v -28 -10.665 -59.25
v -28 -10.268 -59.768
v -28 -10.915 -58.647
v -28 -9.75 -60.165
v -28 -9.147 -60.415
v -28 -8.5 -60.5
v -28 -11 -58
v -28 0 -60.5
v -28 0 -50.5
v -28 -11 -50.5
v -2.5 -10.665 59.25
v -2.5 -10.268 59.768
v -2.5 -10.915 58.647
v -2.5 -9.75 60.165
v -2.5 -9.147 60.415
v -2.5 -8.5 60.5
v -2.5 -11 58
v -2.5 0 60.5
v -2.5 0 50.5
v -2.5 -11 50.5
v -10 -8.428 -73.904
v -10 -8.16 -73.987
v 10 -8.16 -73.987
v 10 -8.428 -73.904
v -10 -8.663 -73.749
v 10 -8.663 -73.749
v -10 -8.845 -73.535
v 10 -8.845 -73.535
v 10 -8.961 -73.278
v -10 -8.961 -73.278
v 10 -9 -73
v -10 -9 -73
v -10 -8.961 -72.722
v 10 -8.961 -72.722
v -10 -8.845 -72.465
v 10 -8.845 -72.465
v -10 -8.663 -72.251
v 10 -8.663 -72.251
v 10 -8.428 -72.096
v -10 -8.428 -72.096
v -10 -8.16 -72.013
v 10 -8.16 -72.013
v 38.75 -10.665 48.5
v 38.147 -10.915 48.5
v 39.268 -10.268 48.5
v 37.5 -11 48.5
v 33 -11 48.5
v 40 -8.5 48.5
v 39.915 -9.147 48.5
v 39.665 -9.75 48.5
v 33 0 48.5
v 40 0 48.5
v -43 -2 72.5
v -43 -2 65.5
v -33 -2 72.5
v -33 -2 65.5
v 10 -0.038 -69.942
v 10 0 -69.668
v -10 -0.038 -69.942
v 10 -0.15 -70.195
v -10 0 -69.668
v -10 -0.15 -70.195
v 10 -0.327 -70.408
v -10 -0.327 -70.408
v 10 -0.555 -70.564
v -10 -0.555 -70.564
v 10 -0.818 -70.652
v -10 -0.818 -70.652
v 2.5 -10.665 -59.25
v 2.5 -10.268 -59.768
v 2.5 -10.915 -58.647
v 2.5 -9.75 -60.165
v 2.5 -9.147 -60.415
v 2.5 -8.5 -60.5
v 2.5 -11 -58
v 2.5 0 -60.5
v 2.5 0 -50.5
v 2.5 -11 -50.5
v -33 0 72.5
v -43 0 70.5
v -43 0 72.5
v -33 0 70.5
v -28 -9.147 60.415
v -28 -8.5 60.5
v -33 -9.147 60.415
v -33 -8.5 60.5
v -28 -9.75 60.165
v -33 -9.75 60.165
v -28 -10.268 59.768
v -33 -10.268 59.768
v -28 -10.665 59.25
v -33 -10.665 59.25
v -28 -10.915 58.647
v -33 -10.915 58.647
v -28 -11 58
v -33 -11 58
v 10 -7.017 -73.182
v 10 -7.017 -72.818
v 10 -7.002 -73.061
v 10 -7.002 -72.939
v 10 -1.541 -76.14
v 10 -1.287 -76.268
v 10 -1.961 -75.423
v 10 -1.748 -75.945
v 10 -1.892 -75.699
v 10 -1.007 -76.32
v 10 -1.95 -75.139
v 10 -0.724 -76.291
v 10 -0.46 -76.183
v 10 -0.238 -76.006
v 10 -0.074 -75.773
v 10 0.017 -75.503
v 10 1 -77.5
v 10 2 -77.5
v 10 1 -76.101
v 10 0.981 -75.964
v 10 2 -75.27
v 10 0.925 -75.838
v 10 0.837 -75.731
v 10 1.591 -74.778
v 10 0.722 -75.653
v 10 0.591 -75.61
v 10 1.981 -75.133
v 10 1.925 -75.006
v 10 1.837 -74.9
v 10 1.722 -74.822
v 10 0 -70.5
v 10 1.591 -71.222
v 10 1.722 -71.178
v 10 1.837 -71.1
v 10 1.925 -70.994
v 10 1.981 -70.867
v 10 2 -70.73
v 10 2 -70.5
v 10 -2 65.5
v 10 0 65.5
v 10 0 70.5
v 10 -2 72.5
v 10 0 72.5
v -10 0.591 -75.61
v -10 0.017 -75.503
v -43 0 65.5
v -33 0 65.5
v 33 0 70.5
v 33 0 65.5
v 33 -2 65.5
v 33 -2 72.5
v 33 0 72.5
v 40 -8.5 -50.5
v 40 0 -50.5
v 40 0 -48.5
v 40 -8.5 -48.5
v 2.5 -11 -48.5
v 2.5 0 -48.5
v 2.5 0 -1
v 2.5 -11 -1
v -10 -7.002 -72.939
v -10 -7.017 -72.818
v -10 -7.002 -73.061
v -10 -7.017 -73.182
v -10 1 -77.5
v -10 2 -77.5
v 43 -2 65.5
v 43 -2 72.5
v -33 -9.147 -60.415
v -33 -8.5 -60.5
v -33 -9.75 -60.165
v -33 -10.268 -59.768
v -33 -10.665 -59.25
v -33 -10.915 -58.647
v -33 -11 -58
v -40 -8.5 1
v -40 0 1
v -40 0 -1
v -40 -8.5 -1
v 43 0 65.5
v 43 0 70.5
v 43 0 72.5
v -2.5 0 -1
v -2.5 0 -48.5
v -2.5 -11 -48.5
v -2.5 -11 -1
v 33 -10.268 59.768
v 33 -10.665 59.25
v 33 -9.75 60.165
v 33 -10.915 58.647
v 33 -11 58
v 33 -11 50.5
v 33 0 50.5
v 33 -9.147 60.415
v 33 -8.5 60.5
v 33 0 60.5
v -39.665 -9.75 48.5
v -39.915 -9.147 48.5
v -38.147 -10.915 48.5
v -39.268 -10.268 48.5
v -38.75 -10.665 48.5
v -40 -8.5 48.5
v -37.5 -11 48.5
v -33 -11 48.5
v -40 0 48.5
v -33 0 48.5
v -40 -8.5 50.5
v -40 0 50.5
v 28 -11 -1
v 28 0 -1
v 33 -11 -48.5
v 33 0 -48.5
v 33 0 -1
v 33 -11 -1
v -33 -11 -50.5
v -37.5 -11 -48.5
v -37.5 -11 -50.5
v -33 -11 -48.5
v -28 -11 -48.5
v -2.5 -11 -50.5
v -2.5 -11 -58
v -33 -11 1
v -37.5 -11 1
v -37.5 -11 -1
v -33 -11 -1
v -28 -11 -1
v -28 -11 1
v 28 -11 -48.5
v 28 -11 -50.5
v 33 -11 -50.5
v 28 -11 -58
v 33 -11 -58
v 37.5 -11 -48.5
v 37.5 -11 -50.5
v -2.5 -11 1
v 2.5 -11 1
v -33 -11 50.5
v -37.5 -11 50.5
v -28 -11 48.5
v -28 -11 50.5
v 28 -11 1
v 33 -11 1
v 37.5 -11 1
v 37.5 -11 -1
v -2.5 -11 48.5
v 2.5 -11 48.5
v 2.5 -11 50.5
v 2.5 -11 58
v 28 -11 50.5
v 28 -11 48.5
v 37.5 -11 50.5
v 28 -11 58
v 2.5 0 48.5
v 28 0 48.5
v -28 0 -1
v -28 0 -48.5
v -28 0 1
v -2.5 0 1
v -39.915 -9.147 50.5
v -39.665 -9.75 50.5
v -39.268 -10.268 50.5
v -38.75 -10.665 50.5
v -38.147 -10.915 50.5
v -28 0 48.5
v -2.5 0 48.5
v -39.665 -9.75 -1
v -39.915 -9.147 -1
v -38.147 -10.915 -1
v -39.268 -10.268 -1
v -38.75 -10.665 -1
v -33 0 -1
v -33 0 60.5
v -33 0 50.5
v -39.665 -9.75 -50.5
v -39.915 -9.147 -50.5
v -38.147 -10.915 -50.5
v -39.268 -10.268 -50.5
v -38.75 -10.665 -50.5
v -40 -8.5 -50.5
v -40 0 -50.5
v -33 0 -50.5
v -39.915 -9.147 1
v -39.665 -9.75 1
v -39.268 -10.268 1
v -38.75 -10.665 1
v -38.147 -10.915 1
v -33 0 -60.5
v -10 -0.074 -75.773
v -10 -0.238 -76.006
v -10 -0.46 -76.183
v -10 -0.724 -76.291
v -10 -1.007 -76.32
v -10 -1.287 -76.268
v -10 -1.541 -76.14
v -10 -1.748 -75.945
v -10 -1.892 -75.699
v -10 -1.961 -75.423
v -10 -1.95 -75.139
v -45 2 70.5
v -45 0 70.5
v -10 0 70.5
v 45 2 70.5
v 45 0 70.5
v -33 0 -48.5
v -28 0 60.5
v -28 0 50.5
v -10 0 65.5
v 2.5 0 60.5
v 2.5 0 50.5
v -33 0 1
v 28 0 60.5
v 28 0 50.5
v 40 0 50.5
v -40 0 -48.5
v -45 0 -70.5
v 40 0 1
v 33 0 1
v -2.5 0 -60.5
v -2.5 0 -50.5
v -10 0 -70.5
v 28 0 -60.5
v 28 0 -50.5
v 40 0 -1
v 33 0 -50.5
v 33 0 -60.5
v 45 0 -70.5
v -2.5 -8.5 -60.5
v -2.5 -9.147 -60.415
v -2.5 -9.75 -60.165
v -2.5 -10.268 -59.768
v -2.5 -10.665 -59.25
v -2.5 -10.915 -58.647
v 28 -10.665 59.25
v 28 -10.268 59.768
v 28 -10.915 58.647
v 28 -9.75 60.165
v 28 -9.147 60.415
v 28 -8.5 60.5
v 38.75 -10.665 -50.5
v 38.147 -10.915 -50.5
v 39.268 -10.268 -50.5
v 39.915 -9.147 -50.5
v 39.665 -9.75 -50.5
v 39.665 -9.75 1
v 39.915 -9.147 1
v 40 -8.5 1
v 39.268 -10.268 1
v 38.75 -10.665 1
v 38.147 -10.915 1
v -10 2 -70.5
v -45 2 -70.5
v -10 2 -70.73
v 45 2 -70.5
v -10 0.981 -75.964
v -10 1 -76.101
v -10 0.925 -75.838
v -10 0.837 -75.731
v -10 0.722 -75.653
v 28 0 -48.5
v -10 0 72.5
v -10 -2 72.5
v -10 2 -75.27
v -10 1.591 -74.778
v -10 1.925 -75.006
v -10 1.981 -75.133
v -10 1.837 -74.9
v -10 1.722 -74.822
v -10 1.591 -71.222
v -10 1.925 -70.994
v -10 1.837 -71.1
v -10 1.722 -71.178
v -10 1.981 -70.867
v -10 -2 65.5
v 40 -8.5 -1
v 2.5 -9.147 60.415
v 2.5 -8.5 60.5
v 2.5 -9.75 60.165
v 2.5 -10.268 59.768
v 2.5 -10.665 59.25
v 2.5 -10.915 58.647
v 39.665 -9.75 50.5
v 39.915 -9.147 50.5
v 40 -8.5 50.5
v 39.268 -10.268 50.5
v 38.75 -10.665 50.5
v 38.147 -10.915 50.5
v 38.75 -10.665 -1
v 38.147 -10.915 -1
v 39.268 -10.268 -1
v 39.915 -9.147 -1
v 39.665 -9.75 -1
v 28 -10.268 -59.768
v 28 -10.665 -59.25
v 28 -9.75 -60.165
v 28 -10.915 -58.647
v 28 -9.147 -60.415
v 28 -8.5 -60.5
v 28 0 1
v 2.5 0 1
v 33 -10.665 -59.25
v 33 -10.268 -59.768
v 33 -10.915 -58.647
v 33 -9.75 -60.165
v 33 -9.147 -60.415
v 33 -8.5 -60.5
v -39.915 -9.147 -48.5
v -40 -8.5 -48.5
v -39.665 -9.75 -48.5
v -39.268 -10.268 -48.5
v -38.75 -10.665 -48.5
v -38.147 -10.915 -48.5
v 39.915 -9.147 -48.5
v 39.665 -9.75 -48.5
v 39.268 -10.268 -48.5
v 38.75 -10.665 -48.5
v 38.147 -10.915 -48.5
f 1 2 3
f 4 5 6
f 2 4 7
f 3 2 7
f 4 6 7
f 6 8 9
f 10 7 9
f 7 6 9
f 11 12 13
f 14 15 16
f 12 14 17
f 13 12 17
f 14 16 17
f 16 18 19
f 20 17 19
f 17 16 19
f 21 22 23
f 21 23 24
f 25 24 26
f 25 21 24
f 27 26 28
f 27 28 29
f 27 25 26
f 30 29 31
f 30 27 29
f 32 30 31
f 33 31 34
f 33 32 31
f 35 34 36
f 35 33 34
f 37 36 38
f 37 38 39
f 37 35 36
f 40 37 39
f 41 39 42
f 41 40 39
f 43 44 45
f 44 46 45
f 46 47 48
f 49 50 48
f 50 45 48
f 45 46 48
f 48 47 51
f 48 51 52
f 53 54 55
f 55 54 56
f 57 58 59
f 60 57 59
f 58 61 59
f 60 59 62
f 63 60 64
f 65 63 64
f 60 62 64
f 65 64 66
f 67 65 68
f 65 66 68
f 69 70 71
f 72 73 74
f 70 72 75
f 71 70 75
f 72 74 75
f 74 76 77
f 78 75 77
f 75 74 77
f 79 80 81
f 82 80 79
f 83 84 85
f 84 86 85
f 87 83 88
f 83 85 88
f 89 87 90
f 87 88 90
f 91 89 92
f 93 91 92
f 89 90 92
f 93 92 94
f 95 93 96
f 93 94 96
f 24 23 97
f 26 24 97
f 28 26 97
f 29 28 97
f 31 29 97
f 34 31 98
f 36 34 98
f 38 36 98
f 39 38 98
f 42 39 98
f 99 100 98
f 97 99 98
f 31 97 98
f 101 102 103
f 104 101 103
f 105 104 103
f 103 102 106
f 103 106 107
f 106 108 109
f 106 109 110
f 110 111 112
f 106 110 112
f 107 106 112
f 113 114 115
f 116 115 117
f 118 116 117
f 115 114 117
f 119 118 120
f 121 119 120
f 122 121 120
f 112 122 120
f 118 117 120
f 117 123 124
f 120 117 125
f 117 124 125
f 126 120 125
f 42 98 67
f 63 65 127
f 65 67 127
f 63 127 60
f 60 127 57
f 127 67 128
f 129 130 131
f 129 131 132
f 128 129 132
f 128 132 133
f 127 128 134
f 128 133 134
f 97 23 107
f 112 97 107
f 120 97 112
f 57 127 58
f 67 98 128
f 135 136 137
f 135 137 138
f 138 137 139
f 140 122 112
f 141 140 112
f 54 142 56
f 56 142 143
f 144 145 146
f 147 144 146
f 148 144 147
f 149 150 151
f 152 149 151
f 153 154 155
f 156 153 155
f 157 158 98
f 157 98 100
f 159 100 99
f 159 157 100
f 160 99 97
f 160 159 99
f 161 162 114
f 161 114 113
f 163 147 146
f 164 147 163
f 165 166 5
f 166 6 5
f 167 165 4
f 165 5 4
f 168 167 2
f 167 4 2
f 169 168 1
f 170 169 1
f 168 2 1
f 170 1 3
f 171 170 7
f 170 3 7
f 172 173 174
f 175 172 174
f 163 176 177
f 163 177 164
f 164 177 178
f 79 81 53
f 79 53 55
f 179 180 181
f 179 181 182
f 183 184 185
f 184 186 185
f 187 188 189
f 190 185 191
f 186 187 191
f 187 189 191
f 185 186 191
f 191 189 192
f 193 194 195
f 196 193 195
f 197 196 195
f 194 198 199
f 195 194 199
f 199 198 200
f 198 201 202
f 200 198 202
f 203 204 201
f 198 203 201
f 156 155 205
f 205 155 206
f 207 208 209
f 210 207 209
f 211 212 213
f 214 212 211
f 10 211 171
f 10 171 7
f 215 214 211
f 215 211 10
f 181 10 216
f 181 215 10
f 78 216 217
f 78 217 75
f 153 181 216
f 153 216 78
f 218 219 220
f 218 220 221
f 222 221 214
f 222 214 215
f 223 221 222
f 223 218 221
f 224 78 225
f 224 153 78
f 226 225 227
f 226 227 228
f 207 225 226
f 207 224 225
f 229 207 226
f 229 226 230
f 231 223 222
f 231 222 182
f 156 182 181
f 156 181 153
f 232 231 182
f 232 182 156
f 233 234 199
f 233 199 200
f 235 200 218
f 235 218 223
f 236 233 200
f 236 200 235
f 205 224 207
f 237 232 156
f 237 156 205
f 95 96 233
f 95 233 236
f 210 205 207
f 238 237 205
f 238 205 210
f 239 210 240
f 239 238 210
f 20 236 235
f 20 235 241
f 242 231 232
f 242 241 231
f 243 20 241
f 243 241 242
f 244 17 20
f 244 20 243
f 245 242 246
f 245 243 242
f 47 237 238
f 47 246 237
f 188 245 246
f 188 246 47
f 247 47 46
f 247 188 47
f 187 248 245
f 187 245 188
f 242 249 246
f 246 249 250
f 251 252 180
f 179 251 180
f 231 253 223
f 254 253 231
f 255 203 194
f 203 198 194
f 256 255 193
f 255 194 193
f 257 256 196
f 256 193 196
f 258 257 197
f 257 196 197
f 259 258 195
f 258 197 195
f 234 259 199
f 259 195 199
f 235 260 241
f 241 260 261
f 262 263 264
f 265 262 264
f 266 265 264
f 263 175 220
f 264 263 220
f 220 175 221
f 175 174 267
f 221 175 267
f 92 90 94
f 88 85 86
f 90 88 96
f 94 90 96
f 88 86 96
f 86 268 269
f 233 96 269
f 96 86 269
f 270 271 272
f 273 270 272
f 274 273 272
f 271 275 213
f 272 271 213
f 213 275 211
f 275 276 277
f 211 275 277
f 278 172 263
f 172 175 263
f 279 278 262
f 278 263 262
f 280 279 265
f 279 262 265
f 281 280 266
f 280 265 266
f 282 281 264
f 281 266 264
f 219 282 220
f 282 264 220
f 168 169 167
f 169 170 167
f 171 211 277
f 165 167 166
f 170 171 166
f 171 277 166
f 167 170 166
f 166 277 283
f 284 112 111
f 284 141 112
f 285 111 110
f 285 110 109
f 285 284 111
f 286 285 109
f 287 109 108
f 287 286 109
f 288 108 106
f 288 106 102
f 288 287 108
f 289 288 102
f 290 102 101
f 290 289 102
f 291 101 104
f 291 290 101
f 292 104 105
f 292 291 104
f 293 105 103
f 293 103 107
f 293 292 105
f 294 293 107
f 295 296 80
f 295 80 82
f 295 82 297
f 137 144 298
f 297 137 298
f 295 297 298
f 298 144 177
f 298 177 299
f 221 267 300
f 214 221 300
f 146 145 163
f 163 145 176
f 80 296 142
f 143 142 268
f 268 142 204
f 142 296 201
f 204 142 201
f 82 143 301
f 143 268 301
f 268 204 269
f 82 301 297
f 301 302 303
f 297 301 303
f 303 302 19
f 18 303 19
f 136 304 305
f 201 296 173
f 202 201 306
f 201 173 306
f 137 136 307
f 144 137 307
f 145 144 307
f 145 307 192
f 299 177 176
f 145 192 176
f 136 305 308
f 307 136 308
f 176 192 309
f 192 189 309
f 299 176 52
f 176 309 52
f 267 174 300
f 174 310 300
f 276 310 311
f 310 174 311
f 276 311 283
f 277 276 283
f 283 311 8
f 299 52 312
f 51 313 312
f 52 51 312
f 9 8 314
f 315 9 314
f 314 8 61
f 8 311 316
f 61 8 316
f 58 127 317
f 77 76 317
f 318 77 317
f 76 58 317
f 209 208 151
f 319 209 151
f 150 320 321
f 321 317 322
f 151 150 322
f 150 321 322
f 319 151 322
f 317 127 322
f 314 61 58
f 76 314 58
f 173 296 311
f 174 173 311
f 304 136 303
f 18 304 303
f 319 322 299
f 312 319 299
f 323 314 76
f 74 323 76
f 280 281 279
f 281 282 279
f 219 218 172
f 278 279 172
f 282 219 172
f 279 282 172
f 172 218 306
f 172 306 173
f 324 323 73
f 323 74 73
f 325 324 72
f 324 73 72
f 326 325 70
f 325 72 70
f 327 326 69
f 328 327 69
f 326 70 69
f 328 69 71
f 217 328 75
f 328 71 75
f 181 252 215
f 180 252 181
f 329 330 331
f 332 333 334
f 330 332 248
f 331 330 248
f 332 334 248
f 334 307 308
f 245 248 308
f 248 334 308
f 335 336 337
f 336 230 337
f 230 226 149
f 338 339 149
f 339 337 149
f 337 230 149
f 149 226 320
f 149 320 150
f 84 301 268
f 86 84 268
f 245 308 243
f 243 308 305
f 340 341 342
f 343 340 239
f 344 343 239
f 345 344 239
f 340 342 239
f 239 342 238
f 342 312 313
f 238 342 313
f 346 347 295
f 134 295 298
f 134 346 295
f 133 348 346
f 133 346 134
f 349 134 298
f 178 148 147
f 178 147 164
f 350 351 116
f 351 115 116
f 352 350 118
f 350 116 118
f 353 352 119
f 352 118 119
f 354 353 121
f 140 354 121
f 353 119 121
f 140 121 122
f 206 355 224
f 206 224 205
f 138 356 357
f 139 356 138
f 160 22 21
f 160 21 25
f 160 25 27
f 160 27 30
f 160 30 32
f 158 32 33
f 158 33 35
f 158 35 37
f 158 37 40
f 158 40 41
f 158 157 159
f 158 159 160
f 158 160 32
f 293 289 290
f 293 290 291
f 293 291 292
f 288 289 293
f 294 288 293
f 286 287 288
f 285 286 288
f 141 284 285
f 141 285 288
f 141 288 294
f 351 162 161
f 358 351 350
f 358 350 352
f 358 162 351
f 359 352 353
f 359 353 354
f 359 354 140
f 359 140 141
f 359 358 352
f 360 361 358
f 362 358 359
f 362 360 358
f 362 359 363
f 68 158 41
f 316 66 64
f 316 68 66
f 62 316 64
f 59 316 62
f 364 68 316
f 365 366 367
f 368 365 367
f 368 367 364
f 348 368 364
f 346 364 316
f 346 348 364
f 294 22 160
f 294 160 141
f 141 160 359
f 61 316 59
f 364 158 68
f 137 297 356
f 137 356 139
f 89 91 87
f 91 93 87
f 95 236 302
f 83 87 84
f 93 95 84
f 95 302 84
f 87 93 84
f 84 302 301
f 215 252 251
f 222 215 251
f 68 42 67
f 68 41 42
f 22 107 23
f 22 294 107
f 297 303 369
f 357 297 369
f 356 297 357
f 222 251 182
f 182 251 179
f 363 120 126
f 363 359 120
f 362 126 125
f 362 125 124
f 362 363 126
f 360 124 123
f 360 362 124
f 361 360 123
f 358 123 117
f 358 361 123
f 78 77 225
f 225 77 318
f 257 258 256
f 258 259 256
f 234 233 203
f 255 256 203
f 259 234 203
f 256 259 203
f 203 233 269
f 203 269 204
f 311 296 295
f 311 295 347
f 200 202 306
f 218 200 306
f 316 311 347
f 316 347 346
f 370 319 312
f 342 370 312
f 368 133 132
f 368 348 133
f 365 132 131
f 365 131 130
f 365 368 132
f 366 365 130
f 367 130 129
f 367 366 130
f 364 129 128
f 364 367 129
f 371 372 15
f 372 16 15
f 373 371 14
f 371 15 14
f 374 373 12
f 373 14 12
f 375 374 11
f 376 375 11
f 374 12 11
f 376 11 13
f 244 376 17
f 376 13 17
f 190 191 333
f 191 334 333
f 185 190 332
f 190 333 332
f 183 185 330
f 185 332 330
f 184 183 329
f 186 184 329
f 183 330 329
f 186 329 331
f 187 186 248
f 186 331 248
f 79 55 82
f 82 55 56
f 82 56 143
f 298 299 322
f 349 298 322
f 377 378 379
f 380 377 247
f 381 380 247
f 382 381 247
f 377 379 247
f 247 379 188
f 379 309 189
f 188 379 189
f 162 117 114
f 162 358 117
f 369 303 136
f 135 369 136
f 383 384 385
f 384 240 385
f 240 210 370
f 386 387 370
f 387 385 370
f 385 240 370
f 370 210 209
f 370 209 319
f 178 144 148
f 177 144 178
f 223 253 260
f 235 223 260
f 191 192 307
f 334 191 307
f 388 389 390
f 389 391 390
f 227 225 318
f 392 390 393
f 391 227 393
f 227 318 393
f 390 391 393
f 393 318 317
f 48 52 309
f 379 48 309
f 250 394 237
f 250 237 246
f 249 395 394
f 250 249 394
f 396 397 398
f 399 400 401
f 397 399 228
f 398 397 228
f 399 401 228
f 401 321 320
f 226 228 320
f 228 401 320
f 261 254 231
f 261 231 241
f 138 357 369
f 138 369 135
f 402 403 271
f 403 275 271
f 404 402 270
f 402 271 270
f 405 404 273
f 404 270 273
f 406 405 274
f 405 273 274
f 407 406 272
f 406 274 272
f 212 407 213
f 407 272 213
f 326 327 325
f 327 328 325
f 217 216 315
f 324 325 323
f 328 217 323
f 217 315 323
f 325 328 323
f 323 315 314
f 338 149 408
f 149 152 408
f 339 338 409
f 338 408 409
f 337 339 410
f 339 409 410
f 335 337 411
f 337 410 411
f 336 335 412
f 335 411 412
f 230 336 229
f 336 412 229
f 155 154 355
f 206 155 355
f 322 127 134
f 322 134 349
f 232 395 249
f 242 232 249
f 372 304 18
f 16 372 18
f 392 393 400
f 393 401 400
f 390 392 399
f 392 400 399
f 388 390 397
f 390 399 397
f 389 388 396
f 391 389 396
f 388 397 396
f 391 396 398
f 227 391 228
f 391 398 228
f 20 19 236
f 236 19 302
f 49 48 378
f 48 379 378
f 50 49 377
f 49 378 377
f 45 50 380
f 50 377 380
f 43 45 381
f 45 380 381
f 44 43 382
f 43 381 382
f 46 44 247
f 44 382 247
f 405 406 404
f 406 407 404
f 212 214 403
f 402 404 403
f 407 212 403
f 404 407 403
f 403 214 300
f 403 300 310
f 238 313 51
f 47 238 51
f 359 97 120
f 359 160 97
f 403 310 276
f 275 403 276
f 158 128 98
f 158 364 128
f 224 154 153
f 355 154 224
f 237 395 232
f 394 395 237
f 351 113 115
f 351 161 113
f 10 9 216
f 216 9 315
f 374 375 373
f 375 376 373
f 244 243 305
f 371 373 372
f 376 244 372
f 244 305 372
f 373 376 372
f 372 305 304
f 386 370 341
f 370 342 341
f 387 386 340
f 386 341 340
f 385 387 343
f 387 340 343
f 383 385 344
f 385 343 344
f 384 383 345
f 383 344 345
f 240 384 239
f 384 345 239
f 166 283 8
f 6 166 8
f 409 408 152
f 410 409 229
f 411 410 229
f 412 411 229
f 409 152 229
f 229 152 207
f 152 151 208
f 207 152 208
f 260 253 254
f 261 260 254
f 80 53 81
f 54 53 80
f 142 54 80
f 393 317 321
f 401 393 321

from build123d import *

# Parameters (mm, degrees)
SKETCH1_W           = 90
SKETCH1_H           = 141
BOSS_EXTRUDE1_DEPTH = 2
SKETCH2_W           = 20
SKETCH2_H           = 5
SKETCH2_W_2         = 10
BOSS_EXTRUDE2_DEPTH = 2
SKETCH3_W           = 10
SKETCH3_H           = 2
SKETCH3_W_2         = 20
BOSS_EXTRUDE3_DEPTH = 2
BOSS_EXTRUDE4_DEPTH = 10
FILLET1_R           = 1
FILLET2_R           = 0.5
FILLET3_R           = 0.5
SKETCH5_W           = 25.5
SKETCH5_H           = 47.5
BOSS_EXTRUDE5_DEPTH = 11
FILLET4_R           = 2.5


with BuildPart() as part:
    # Sketch1 → Boss-Extrude1 (new body)
    with BuildSketch(Plane(origin=(0, 0, 0), x_dir=(1, 0, 0), z_dir=(0, 1, 0))):
        Rectangle(SKETCH1_W, SKETCH1_H)
    extrude(amount=BOSS_EXTRUDE1_DEPTH)

    # Sketch2 → Boss-Extrude2 (add)
    with BuildSketch(Plane.XZ):
        with Locations((0, 68)):
            Rectangle(SKETCH2_W, SKETCH2_H)
        with Locations((-38, 68)):
            Rectangle(SKETCH2_W_2, SKETCH2_H)
        with Locations((38, 68)):
            Rectangle(SKETCH2_W_2, SKETCH2_H)
    extrude(amount=BOSS_EXTRUDE2_DEPTH)

    # Sketch3 → Boss-Extrude3 (add)
    with BuildSketch(Plane.XY.offset(70.5)):
        with Locations((-38, -1)):
            Rectangle(SKETCH3_W, SKETCH3_H)
        with Locations((0, -1)):
            Rectangle(SKETCH3_W_2, SKETCH3_H)
        with Locations((38, -1)):
            Rectangle(SKETCH3_W, SKETCH3_H)
    extrude(amount=BOSS_EXTRUDE3_DEPTH)

    # Sketch4 → Boss-Extrude4 (add, symmetric)
    with BuildSketch(Plane.ZY):
        with BuildLine():
            Line((-72.817686313, -7.01649029), (-72.817734573, -7.016750635))
            ThreePointArc((-72.817734573, -7.016750635), (-73, -7), (-73.182265427, -7.016750635))
            Line((-73.182265427, -7.016750635), (-73.182313687, -7.01649029))
            Line((-73.182313687, -7.01649029), (-74.853705002, 2))
            Line((-74.853705002, 2), (-75.5, 2))
            Line((-75.5, 2), (-77.5, 2))
            Line((-77.5, 2), (-77.5, 1))
            Line((-77.5, 1), (-75.6853705, 1))
            Line((-75.6853705, 1), (-75.503105074, 0.016750635))
            ThreePointArc((-75.503105074, 0.016750635), (-76.304089012, -1.148764157), (-75.13857422, -1.949748096))
            Line((-75.13857422, -1.949748096), (-73.987443964, -8.159637236))
            ThreePointArc((-73.987443964, -8.159637236), (-73, -9.00026478), (-72.012556036, -8.159637236))
            Line((-72.012556036, -8.159637236), (-70.5, 0))
            Line((-70.5, 0), (-70.5, 2))
            Line((-70.5, 2), (-71.146294998, 2))
            Line((-71.146294998, 2), (-72.817686313, -7.01649029))
        make_face()
    extrude(amount=BOSS_EXTRUDE4_DEPTH, both=True)

    # Fillet1
    fillet1_edges = [part.edges().sort_by_distance(p)[0] for p in [
        (0, 0, -70.5),
    ]]
    fillet(fillet1_edges, radius=FILLET1_R)

    # Fillet2
    fillet2_edges = [part.edges().sort_by_distance(p)[0] for p in [
        (0, 2, -74.853705002),
        (0, 2, -71.146294998),
    ]]
    fillet(fillet2_edges, radius=FILLET2_R)

    # Fillet3
    fillet3_edges = [part.edges().sort_by_distance(p)[0] for p in [
        (0, 1, -75.6853705),
    ]]
    fillet(fillet3_edges, radius=FILLET3_R)

    # Sketch5 → Boss-Extrude5 (add)
    with BuildSketch(Plane.XZ):
        Polygon((33, 50.5), (33, 60.5), (28, 60.5), (28, 50.5), (2.5, 50.5), (2.5, 60.5), (-2.5, 60.5), (-2.5, 50.5), (-28, 50.5), (-28, 60.5), (-33, 60.5), (-33, 50.5), (-40, 50.5), (-40, 48.5), (-33, 48.5), (-33, 1), (-40, 1), (-40, -1), (-33, -1), (-33, -48.5), (-40, -48.5), (-40, -50.5), (-33, -50.5), (-33, -60.5), (-28, -60.5), (-28, -50.5), (-2.5, -50.5), (-2.5, -60.5), (2.5, -60.5), (2.5, -50.5), (28, -50.5), (28, -60.5), (33, -60.5), (33, -50.5), (40, -50.5), (40, -48.5), (33, -48.5), (33, -1), (40, -1), (40, 1), (33, 1), (33, 48.5), (40, 48.5), (40, 50.5), align=None)
        with Locations((-15.25, -24.75)):
            Rectangle(SKETCH5_W, SKETCH5_H, mode=Mode.SUBTRACT)
        with Locations((15.25, -24.75)):
            Rectangle(SKETCH5_W, SKETCH5_H, mode=Mode.SUBTRACT)
        with Locations((-15.25, 24.75)):
            Rectangle(SKETCH5_W, SKETCH5_H, mode=Mode.SUBTRACT)
        with Locations((15.25, 24.75)):
            Rectangle(SKETCH5_W, SKETCH5_H, mode=Mode.SUBTRACT)
    extrude(amount=BOSS_EXTRUDE5_DEPTH)

    # Fillet4
    fillet4_edges = [part.edges().sort_by_distance(p)[0] for p in [
        (-40, -11, 49.5),
        (40, -11, 49.5),
        (40, -11, 0),
        (-40, -11, 0),
        (-40, -11, -49.5),
        (40, -11, -49.5),
        (-30.5, -11, 60.5),
        (0, -11, 60.5),
        (30.5, -11, 60.5),
        (0, -11, -60.5),
        (-30.5, -11, -60.5),
        (30.5, -11, -60.5),
    ]]
    fillet(fillet4_edges, radius=FILLET4_R)


solid = part.part
